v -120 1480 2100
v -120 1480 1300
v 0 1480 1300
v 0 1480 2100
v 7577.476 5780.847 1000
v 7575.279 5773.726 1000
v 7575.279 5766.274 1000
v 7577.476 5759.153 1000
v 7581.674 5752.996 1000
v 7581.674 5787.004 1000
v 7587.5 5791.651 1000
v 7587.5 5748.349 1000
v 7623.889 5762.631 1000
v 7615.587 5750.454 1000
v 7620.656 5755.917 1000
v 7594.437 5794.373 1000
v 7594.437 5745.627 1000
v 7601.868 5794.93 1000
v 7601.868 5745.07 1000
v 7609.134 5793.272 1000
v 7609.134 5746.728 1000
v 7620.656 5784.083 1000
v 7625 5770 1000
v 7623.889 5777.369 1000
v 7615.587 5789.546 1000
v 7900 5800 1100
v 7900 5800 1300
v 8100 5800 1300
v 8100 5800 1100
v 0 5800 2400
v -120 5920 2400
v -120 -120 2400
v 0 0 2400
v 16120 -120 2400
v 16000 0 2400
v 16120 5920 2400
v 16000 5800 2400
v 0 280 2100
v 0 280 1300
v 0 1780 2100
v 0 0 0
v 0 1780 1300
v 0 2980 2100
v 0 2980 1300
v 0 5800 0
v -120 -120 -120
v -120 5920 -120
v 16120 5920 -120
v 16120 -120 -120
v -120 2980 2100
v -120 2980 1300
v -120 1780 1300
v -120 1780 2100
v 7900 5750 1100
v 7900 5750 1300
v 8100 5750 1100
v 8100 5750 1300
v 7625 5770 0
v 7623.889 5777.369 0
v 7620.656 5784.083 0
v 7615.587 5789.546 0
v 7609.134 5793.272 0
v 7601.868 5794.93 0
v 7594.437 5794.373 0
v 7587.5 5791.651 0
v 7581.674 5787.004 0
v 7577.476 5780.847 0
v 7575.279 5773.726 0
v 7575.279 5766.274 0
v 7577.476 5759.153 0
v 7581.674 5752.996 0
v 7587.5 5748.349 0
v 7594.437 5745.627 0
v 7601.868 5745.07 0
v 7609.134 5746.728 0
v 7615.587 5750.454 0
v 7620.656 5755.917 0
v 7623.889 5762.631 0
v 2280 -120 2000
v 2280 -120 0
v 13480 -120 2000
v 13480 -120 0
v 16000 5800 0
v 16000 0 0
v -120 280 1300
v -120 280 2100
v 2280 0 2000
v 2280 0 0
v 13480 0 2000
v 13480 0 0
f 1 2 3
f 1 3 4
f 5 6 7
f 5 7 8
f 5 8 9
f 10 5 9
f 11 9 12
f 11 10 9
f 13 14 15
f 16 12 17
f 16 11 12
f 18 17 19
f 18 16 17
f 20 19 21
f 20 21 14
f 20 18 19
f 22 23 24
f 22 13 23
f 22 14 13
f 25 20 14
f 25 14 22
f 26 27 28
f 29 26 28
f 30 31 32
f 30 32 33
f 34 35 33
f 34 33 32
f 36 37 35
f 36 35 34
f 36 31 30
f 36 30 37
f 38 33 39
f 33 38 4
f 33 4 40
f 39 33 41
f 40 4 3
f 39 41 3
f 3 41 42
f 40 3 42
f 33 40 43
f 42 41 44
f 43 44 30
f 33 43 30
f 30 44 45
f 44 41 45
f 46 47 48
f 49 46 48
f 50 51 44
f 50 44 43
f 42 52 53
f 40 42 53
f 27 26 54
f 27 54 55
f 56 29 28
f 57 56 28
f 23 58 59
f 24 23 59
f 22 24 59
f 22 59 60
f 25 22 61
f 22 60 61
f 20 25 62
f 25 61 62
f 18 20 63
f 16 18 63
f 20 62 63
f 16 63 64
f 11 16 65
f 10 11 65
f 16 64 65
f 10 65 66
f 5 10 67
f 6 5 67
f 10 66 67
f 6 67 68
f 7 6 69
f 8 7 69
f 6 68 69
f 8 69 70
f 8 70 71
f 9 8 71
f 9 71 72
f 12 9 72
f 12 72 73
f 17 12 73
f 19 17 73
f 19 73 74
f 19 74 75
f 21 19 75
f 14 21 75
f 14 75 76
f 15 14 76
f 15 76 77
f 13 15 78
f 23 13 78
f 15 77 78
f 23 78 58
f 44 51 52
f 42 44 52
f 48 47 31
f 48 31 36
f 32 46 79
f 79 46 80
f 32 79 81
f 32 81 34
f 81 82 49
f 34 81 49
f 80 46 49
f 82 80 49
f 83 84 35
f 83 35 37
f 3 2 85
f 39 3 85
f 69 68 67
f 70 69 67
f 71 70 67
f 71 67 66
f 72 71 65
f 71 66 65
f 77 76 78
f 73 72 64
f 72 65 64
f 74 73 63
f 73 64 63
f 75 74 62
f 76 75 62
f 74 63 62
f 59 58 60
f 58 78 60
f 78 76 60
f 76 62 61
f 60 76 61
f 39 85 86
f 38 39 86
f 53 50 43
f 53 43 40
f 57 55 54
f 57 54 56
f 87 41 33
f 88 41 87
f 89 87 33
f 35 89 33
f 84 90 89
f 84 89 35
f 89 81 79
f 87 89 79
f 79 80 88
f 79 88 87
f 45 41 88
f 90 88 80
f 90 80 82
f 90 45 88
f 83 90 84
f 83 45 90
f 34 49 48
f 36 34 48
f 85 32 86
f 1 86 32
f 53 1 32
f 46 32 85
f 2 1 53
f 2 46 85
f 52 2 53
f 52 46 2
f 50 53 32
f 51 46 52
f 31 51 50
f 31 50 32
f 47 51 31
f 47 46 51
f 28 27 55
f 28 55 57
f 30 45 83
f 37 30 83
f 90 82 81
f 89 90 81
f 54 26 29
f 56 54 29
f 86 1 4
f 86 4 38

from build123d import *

# Parameters (mm, degrees)
F0_W      = 16000
F0_H      = 5800
F1_DEPTH  = 2400
F2_T      = 120
F3_W      = 1200
F3_H      = 800
F4_DEPTH  = 120
F5_W      = 2800
F5_H      = 2000
F6_DEPTH  = 1200
F7_W      = 200
F7_H      = 200
F8_DEPTH  = 50
F9_R      = 25
F10_DEPTH = 1000


with BuildPart() as f1:
    # F0 (on Top) → F1 (new body)
    with BuildSketch(Plane.XY):
        with Locations((8000, 2900)):
            Rectangle(F0_W, F0_H)
    extrude(amount=F1_DEPTH)

    # F2
    f2_openings = [f1.faces().sort_by_distance(p)[0] for p in [
        (8000, 2900, 2400),
    ]]
    offset(amount=F2_T, openings=f2_openings, kind=Kind.INTERSECTION)

    # F3 (on face) → F4 (cut)
    with BuildSketch(Plane(origin=(-120, 0, 0), x_dir=(0, -1, 0), z_dir=(-1, 0, 0))):
        with Locations((-2380, 1700)):
            Rectangle(F3_W, F3_H)
        with Locations((-880, 1700)):
            Rectangle(F3_W, F3_H)
    extrude(amount=-F4_DEPTH, mode=Mode.SUBTRACT)

    # F5 (on face) → F6 (cut)
    with BuildSketch(Plane.XZ.offset(120)):
        with Locations((3680, 1000)):
            Rectangle(F5_W, F5_H)
        with Locations((6480, 1000)):
            Rectangle(F5_W, F5_H)
        with Locations((9280, 1000)):
            Rectangle(F5_W, F5_H)
        with Locations((12080, 1000)):
            Rectangle(F5_W, F5_H)
    extrude(amount=-F6_DEPTH, mode=Mode.SUBTRACT)


with BuildPart() as f8:
    # F7 (on face) → F8 (new body)
    with BuildSketch(Plane.XZ.offset(-5800)):
        with Locations((8000, 1200)):
            Rectangle(F7_W, F7_H)
    extrude(amount=F8_DEPTH)


with BuildPart() as f10:
    # F9 (on face) → F10 (new body)
    with BuildSketch(Plane.XY):
        with Locations((7600, 5770)):
            Circle(F9_R)
    extrude(amount=F10_DEPTH)


solid = Compound([f1.part, f8.part, f10.part])
